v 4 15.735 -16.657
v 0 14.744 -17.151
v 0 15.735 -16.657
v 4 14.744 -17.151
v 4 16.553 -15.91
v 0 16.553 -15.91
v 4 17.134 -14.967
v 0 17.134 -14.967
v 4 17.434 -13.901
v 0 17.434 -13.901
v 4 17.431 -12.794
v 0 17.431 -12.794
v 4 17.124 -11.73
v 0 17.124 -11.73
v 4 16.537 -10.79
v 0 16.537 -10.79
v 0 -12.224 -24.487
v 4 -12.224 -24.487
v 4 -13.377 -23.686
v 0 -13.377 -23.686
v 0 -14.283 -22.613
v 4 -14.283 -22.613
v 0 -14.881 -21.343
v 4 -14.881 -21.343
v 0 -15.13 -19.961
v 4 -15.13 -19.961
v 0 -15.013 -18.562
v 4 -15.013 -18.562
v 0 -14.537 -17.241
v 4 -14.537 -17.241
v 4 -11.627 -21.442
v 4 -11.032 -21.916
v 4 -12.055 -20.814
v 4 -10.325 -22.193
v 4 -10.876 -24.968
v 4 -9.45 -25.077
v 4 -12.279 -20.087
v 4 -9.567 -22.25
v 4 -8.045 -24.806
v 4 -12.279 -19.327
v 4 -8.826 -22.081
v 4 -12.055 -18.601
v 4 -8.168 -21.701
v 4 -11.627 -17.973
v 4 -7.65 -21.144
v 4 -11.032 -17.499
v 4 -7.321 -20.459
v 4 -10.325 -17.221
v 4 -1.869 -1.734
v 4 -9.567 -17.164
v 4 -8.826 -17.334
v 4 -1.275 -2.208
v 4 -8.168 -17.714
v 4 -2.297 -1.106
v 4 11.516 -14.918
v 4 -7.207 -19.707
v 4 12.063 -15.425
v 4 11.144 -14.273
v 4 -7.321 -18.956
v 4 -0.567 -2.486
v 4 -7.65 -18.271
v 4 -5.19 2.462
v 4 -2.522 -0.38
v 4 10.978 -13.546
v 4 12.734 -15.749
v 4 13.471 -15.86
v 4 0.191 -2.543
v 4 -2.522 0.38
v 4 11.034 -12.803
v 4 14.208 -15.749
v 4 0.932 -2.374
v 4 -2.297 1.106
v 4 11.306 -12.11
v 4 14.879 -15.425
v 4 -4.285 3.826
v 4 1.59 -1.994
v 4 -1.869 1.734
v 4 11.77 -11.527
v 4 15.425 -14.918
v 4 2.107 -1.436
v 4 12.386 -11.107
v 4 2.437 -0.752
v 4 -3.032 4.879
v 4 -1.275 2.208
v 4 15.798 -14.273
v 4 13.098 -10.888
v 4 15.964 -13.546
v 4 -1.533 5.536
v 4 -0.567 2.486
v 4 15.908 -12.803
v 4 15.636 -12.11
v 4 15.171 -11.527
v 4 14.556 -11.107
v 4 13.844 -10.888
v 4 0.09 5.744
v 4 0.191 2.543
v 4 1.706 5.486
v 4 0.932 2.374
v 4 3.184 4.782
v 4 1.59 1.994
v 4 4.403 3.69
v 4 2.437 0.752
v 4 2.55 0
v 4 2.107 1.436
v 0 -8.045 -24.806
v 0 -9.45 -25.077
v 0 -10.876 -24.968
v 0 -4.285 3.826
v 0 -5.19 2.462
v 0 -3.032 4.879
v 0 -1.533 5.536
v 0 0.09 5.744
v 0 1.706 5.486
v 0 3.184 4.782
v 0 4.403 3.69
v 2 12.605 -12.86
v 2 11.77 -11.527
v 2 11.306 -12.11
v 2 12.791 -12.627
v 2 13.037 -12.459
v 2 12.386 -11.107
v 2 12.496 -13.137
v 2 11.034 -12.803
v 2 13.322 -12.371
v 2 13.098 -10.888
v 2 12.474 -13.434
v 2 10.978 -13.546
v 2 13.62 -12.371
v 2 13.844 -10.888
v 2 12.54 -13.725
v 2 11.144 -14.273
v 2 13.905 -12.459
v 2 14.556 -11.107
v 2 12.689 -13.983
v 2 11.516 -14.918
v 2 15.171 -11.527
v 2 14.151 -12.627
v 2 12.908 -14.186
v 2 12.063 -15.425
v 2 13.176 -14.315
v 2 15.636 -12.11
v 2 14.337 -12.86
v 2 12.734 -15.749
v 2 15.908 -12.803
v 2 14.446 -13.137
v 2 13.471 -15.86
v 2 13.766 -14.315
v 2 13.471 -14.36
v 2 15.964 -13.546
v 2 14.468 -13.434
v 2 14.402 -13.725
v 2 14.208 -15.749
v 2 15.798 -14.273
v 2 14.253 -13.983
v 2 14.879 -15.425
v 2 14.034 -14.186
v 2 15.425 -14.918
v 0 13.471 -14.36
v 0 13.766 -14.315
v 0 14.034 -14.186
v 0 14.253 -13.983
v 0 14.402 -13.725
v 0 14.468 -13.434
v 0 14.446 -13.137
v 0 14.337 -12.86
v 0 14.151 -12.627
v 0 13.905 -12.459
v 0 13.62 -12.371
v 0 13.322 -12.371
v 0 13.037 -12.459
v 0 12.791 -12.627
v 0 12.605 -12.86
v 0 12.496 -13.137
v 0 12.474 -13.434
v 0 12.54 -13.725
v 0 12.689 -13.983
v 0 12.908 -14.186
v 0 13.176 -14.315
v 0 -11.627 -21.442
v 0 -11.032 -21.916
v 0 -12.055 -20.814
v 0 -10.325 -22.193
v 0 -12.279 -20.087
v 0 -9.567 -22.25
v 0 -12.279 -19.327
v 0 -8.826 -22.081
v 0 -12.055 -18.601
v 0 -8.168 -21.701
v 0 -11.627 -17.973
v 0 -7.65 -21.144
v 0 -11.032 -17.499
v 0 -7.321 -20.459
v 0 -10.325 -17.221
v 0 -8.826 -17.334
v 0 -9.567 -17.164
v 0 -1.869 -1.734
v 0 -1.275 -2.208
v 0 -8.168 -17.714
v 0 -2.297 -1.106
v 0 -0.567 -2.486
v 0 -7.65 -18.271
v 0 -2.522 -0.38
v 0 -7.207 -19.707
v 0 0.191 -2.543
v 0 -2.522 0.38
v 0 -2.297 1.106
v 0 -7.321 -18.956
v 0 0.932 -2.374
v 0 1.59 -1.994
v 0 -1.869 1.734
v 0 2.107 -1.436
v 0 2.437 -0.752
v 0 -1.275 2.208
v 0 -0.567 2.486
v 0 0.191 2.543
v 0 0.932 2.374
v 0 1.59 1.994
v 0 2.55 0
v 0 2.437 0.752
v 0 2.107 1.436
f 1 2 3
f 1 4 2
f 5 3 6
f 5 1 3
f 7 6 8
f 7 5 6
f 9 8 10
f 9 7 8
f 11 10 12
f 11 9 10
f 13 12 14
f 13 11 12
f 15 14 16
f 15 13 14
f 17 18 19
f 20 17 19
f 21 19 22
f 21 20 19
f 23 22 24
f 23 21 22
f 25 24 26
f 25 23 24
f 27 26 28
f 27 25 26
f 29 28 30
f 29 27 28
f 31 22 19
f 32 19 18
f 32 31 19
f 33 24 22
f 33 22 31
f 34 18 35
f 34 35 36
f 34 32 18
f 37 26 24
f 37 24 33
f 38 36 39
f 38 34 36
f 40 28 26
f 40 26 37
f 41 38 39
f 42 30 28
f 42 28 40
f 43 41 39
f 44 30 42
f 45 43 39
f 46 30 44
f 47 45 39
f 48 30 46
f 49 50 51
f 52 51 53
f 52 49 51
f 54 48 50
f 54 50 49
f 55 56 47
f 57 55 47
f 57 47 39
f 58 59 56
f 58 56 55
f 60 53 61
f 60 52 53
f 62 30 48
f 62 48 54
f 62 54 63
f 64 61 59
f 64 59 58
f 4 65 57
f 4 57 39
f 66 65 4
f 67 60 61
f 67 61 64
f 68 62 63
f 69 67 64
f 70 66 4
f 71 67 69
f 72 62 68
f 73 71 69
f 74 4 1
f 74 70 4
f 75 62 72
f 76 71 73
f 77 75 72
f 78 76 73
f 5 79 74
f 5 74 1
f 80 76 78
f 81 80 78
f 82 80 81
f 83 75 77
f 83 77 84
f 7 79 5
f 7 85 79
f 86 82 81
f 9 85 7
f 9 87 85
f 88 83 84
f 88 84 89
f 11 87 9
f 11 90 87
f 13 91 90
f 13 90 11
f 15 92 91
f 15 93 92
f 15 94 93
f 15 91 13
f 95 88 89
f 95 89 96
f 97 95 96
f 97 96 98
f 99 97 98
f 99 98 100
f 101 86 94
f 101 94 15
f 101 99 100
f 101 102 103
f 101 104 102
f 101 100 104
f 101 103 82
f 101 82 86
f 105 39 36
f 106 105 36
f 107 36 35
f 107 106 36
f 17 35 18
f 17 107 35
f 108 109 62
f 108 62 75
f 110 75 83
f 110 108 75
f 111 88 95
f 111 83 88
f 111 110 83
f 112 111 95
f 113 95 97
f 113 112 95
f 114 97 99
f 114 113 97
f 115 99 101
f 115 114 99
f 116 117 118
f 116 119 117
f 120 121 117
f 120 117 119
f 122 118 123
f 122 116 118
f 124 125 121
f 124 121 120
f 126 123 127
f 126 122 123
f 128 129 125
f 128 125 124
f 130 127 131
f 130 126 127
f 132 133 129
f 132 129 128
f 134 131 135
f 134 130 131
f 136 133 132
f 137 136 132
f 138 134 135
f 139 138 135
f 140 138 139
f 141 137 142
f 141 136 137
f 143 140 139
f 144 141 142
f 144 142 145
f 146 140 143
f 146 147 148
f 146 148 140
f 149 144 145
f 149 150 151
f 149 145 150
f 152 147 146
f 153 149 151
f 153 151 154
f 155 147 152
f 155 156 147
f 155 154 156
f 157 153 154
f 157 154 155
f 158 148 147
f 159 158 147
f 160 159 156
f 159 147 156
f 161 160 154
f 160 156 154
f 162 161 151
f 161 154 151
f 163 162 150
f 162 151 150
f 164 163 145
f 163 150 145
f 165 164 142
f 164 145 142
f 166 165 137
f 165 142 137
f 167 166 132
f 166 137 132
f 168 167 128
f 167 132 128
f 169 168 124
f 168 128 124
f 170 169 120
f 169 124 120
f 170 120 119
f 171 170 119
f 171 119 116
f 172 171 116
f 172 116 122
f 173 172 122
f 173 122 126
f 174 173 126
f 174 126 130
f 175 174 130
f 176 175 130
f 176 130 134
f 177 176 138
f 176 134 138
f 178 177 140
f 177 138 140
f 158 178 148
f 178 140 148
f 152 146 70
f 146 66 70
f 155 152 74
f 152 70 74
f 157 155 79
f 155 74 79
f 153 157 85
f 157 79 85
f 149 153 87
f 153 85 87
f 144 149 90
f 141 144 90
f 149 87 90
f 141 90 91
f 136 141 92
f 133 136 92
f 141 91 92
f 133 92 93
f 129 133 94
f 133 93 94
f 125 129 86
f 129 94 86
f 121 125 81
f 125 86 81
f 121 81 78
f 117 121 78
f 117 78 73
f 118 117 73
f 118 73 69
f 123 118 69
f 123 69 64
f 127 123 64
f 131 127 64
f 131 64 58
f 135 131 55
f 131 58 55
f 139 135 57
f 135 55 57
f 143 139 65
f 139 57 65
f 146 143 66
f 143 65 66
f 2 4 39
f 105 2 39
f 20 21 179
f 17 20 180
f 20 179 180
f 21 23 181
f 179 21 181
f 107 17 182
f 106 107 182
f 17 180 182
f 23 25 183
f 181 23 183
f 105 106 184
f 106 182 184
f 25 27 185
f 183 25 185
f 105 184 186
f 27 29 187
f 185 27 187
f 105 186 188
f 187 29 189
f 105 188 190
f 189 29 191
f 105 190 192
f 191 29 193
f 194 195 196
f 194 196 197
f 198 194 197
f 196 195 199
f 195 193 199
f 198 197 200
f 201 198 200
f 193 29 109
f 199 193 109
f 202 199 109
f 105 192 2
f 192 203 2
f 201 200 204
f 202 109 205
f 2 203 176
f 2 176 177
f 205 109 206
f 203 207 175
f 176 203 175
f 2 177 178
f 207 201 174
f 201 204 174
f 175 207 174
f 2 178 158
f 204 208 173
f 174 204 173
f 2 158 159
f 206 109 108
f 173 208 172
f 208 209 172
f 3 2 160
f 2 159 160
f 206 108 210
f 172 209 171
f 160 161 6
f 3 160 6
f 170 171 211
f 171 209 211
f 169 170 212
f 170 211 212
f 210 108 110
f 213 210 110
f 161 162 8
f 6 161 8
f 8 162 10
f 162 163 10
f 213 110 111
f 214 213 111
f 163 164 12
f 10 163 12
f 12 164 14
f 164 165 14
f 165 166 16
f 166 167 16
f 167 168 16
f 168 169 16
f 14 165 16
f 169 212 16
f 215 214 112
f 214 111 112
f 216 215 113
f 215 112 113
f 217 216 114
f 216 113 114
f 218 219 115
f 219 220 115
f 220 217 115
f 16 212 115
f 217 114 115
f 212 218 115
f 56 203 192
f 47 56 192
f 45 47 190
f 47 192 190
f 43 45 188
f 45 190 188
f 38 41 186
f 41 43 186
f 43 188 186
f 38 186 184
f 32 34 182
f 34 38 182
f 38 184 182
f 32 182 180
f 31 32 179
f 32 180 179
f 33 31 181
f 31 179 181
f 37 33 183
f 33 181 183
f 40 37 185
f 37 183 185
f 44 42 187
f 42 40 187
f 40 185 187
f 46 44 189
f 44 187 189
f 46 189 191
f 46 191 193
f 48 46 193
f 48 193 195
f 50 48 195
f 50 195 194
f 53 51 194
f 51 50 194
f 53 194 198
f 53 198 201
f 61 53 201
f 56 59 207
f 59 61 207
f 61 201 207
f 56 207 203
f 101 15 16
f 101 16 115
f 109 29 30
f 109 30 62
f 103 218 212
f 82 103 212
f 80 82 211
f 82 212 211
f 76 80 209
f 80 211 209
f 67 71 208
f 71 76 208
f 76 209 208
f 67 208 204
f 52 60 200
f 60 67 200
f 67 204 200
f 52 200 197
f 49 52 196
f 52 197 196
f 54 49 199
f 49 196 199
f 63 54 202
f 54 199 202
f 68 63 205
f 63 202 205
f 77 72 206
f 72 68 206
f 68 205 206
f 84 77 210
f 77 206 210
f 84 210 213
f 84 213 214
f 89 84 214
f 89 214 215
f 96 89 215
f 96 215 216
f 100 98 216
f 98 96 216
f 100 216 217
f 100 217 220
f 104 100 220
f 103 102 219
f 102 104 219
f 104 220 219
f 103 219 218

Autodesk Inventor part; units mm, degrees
ref_plane "YZ Plane" through (0, 0, 0) normal (1, 0, 0) x (0, 1, 0)
ref_plane "XZ Plane" through (0, 0, 0) normal (0, 1, 0) x (-1, 0, 0)
ref_plane "XY Plane" through (0, 0, 0) normal (0, 0, 1) x (1, 0, 0)
sketch "Sketch1" plane through (0, 0, 0) normal (1, 0, 0) x (0, 1, 0)
  circle A0 centre (-9.7574, -19.7073) radius 1.55 construction
  circle A1 centre (0, 0) radius 1.55 construction
  circle A2 centre (-9.7574, -19.7073) radius 2.55
  circle A3 centre (0, 0) radius 2.55
  line L0 (-6.0684, -24.2876) -> (12.7398, 12.1607) construction
  arc A4 (-12.2239, -24.4871) -> (-4.9776, -22.1738) centre (-9.7574, -19.7073) ccw
  circle A5 centre (0, 0) radius 5.7448
  line L1 (-4.9776, -22.1738) -> (5.1052, -2.6344)
  arc A6 (-4.9776, -22.1738) -> (-12.2239, -24.4871) centre (-9.7574, -19.7073) ccw
  line L2 (-14.5372, -17.2408) -> (-5.1904, 2.4623)
  line L3 (0, 0) -> (0, -27.0135) construction
  line L4 (0, 0) -> (-9.7574, -19.7073) construction
  point P0 (-10.1101, -25.5779)
  dimension "d0" = 5.1
  dimension "d1" = 5.1
  dimension "d3" = 11.4897
  dimension "d4" = 5.3787
  dimension "d5" = 21.8076
  dimension "d6" = 21.9875
extrude "Extrusion1" add sketch "Sketch1" along normal blind 4
sketch "Sketch2" plane through (4, 0, 0) normal (1, 0, 0) x (0, 0, -1)
  arc A0 (17.2408, -14.5372) -> (22.1738, -4.9776) centre (19.7073, -9.7574) ccw projected
  line L0 (22.1738, -4.9776) -> (2.6344, 5.1052) projected
  arc A1 (2.6344, 5.1052) -> (-2.4623, -5.1904) centre (0, 0) ccw projected
  line L1 (-2.4623, -5.1904) -> (17.2408, -14.5372) construction
  circle A2 centre (19.7073, -9.7574) radius 2.55 construction
  circle A3 centre (0, 0) radius 2.55 construction
  circle A4 centre (19.7073, -9.7574) radius 2.55 construction
  line L2 (-0.0042, 0.0021) -> (19.7073, -9.7574) construction
  circle A5 centre (13.3596, 13.4709) radius 1
  circle A6 centre (13.3596, 13.4709) radius 4
  line L3 (10.7905, 16.5368) -> (-3.6897, 4.4033)
  arc A7 (2.6344, 5.1052) -> (-2.4623, -5.1904) centre (0, 0) ccw projected
  line L4 (17.1514, 14.7445) -> (24.806, -8.0448)
  line L5 (-12.5084, -12.3162) -> (6.9664, 27.0174)
  point P0 (-3.6897, 4.4033)
  dimension "d11" = 2
  dimension "d12" = 8
  dimension "d20" = 18
  dimension "d21" = 11.7401
extrude "Extrusion2" add sketch "Sketch2" against normal up to surface (4 mm away)
sketch "Sketch3" plane through (4, 0, 0) normal (1, 0, 0) x (0, 0, -1)
  circle A0 centre (13.3596, 13.4709) radius 1 projected
  circle A1 centre (13.3596, 13.4709) radius 2.5
  point P0 (0, 0)
  dimension "d15" = 5
extrude "Extrusion3" cut sketch "Sketch3" against normal blind 2
properties part number "Kauri modular camera mount nano cam" material "Brass, Soft Yellow"
